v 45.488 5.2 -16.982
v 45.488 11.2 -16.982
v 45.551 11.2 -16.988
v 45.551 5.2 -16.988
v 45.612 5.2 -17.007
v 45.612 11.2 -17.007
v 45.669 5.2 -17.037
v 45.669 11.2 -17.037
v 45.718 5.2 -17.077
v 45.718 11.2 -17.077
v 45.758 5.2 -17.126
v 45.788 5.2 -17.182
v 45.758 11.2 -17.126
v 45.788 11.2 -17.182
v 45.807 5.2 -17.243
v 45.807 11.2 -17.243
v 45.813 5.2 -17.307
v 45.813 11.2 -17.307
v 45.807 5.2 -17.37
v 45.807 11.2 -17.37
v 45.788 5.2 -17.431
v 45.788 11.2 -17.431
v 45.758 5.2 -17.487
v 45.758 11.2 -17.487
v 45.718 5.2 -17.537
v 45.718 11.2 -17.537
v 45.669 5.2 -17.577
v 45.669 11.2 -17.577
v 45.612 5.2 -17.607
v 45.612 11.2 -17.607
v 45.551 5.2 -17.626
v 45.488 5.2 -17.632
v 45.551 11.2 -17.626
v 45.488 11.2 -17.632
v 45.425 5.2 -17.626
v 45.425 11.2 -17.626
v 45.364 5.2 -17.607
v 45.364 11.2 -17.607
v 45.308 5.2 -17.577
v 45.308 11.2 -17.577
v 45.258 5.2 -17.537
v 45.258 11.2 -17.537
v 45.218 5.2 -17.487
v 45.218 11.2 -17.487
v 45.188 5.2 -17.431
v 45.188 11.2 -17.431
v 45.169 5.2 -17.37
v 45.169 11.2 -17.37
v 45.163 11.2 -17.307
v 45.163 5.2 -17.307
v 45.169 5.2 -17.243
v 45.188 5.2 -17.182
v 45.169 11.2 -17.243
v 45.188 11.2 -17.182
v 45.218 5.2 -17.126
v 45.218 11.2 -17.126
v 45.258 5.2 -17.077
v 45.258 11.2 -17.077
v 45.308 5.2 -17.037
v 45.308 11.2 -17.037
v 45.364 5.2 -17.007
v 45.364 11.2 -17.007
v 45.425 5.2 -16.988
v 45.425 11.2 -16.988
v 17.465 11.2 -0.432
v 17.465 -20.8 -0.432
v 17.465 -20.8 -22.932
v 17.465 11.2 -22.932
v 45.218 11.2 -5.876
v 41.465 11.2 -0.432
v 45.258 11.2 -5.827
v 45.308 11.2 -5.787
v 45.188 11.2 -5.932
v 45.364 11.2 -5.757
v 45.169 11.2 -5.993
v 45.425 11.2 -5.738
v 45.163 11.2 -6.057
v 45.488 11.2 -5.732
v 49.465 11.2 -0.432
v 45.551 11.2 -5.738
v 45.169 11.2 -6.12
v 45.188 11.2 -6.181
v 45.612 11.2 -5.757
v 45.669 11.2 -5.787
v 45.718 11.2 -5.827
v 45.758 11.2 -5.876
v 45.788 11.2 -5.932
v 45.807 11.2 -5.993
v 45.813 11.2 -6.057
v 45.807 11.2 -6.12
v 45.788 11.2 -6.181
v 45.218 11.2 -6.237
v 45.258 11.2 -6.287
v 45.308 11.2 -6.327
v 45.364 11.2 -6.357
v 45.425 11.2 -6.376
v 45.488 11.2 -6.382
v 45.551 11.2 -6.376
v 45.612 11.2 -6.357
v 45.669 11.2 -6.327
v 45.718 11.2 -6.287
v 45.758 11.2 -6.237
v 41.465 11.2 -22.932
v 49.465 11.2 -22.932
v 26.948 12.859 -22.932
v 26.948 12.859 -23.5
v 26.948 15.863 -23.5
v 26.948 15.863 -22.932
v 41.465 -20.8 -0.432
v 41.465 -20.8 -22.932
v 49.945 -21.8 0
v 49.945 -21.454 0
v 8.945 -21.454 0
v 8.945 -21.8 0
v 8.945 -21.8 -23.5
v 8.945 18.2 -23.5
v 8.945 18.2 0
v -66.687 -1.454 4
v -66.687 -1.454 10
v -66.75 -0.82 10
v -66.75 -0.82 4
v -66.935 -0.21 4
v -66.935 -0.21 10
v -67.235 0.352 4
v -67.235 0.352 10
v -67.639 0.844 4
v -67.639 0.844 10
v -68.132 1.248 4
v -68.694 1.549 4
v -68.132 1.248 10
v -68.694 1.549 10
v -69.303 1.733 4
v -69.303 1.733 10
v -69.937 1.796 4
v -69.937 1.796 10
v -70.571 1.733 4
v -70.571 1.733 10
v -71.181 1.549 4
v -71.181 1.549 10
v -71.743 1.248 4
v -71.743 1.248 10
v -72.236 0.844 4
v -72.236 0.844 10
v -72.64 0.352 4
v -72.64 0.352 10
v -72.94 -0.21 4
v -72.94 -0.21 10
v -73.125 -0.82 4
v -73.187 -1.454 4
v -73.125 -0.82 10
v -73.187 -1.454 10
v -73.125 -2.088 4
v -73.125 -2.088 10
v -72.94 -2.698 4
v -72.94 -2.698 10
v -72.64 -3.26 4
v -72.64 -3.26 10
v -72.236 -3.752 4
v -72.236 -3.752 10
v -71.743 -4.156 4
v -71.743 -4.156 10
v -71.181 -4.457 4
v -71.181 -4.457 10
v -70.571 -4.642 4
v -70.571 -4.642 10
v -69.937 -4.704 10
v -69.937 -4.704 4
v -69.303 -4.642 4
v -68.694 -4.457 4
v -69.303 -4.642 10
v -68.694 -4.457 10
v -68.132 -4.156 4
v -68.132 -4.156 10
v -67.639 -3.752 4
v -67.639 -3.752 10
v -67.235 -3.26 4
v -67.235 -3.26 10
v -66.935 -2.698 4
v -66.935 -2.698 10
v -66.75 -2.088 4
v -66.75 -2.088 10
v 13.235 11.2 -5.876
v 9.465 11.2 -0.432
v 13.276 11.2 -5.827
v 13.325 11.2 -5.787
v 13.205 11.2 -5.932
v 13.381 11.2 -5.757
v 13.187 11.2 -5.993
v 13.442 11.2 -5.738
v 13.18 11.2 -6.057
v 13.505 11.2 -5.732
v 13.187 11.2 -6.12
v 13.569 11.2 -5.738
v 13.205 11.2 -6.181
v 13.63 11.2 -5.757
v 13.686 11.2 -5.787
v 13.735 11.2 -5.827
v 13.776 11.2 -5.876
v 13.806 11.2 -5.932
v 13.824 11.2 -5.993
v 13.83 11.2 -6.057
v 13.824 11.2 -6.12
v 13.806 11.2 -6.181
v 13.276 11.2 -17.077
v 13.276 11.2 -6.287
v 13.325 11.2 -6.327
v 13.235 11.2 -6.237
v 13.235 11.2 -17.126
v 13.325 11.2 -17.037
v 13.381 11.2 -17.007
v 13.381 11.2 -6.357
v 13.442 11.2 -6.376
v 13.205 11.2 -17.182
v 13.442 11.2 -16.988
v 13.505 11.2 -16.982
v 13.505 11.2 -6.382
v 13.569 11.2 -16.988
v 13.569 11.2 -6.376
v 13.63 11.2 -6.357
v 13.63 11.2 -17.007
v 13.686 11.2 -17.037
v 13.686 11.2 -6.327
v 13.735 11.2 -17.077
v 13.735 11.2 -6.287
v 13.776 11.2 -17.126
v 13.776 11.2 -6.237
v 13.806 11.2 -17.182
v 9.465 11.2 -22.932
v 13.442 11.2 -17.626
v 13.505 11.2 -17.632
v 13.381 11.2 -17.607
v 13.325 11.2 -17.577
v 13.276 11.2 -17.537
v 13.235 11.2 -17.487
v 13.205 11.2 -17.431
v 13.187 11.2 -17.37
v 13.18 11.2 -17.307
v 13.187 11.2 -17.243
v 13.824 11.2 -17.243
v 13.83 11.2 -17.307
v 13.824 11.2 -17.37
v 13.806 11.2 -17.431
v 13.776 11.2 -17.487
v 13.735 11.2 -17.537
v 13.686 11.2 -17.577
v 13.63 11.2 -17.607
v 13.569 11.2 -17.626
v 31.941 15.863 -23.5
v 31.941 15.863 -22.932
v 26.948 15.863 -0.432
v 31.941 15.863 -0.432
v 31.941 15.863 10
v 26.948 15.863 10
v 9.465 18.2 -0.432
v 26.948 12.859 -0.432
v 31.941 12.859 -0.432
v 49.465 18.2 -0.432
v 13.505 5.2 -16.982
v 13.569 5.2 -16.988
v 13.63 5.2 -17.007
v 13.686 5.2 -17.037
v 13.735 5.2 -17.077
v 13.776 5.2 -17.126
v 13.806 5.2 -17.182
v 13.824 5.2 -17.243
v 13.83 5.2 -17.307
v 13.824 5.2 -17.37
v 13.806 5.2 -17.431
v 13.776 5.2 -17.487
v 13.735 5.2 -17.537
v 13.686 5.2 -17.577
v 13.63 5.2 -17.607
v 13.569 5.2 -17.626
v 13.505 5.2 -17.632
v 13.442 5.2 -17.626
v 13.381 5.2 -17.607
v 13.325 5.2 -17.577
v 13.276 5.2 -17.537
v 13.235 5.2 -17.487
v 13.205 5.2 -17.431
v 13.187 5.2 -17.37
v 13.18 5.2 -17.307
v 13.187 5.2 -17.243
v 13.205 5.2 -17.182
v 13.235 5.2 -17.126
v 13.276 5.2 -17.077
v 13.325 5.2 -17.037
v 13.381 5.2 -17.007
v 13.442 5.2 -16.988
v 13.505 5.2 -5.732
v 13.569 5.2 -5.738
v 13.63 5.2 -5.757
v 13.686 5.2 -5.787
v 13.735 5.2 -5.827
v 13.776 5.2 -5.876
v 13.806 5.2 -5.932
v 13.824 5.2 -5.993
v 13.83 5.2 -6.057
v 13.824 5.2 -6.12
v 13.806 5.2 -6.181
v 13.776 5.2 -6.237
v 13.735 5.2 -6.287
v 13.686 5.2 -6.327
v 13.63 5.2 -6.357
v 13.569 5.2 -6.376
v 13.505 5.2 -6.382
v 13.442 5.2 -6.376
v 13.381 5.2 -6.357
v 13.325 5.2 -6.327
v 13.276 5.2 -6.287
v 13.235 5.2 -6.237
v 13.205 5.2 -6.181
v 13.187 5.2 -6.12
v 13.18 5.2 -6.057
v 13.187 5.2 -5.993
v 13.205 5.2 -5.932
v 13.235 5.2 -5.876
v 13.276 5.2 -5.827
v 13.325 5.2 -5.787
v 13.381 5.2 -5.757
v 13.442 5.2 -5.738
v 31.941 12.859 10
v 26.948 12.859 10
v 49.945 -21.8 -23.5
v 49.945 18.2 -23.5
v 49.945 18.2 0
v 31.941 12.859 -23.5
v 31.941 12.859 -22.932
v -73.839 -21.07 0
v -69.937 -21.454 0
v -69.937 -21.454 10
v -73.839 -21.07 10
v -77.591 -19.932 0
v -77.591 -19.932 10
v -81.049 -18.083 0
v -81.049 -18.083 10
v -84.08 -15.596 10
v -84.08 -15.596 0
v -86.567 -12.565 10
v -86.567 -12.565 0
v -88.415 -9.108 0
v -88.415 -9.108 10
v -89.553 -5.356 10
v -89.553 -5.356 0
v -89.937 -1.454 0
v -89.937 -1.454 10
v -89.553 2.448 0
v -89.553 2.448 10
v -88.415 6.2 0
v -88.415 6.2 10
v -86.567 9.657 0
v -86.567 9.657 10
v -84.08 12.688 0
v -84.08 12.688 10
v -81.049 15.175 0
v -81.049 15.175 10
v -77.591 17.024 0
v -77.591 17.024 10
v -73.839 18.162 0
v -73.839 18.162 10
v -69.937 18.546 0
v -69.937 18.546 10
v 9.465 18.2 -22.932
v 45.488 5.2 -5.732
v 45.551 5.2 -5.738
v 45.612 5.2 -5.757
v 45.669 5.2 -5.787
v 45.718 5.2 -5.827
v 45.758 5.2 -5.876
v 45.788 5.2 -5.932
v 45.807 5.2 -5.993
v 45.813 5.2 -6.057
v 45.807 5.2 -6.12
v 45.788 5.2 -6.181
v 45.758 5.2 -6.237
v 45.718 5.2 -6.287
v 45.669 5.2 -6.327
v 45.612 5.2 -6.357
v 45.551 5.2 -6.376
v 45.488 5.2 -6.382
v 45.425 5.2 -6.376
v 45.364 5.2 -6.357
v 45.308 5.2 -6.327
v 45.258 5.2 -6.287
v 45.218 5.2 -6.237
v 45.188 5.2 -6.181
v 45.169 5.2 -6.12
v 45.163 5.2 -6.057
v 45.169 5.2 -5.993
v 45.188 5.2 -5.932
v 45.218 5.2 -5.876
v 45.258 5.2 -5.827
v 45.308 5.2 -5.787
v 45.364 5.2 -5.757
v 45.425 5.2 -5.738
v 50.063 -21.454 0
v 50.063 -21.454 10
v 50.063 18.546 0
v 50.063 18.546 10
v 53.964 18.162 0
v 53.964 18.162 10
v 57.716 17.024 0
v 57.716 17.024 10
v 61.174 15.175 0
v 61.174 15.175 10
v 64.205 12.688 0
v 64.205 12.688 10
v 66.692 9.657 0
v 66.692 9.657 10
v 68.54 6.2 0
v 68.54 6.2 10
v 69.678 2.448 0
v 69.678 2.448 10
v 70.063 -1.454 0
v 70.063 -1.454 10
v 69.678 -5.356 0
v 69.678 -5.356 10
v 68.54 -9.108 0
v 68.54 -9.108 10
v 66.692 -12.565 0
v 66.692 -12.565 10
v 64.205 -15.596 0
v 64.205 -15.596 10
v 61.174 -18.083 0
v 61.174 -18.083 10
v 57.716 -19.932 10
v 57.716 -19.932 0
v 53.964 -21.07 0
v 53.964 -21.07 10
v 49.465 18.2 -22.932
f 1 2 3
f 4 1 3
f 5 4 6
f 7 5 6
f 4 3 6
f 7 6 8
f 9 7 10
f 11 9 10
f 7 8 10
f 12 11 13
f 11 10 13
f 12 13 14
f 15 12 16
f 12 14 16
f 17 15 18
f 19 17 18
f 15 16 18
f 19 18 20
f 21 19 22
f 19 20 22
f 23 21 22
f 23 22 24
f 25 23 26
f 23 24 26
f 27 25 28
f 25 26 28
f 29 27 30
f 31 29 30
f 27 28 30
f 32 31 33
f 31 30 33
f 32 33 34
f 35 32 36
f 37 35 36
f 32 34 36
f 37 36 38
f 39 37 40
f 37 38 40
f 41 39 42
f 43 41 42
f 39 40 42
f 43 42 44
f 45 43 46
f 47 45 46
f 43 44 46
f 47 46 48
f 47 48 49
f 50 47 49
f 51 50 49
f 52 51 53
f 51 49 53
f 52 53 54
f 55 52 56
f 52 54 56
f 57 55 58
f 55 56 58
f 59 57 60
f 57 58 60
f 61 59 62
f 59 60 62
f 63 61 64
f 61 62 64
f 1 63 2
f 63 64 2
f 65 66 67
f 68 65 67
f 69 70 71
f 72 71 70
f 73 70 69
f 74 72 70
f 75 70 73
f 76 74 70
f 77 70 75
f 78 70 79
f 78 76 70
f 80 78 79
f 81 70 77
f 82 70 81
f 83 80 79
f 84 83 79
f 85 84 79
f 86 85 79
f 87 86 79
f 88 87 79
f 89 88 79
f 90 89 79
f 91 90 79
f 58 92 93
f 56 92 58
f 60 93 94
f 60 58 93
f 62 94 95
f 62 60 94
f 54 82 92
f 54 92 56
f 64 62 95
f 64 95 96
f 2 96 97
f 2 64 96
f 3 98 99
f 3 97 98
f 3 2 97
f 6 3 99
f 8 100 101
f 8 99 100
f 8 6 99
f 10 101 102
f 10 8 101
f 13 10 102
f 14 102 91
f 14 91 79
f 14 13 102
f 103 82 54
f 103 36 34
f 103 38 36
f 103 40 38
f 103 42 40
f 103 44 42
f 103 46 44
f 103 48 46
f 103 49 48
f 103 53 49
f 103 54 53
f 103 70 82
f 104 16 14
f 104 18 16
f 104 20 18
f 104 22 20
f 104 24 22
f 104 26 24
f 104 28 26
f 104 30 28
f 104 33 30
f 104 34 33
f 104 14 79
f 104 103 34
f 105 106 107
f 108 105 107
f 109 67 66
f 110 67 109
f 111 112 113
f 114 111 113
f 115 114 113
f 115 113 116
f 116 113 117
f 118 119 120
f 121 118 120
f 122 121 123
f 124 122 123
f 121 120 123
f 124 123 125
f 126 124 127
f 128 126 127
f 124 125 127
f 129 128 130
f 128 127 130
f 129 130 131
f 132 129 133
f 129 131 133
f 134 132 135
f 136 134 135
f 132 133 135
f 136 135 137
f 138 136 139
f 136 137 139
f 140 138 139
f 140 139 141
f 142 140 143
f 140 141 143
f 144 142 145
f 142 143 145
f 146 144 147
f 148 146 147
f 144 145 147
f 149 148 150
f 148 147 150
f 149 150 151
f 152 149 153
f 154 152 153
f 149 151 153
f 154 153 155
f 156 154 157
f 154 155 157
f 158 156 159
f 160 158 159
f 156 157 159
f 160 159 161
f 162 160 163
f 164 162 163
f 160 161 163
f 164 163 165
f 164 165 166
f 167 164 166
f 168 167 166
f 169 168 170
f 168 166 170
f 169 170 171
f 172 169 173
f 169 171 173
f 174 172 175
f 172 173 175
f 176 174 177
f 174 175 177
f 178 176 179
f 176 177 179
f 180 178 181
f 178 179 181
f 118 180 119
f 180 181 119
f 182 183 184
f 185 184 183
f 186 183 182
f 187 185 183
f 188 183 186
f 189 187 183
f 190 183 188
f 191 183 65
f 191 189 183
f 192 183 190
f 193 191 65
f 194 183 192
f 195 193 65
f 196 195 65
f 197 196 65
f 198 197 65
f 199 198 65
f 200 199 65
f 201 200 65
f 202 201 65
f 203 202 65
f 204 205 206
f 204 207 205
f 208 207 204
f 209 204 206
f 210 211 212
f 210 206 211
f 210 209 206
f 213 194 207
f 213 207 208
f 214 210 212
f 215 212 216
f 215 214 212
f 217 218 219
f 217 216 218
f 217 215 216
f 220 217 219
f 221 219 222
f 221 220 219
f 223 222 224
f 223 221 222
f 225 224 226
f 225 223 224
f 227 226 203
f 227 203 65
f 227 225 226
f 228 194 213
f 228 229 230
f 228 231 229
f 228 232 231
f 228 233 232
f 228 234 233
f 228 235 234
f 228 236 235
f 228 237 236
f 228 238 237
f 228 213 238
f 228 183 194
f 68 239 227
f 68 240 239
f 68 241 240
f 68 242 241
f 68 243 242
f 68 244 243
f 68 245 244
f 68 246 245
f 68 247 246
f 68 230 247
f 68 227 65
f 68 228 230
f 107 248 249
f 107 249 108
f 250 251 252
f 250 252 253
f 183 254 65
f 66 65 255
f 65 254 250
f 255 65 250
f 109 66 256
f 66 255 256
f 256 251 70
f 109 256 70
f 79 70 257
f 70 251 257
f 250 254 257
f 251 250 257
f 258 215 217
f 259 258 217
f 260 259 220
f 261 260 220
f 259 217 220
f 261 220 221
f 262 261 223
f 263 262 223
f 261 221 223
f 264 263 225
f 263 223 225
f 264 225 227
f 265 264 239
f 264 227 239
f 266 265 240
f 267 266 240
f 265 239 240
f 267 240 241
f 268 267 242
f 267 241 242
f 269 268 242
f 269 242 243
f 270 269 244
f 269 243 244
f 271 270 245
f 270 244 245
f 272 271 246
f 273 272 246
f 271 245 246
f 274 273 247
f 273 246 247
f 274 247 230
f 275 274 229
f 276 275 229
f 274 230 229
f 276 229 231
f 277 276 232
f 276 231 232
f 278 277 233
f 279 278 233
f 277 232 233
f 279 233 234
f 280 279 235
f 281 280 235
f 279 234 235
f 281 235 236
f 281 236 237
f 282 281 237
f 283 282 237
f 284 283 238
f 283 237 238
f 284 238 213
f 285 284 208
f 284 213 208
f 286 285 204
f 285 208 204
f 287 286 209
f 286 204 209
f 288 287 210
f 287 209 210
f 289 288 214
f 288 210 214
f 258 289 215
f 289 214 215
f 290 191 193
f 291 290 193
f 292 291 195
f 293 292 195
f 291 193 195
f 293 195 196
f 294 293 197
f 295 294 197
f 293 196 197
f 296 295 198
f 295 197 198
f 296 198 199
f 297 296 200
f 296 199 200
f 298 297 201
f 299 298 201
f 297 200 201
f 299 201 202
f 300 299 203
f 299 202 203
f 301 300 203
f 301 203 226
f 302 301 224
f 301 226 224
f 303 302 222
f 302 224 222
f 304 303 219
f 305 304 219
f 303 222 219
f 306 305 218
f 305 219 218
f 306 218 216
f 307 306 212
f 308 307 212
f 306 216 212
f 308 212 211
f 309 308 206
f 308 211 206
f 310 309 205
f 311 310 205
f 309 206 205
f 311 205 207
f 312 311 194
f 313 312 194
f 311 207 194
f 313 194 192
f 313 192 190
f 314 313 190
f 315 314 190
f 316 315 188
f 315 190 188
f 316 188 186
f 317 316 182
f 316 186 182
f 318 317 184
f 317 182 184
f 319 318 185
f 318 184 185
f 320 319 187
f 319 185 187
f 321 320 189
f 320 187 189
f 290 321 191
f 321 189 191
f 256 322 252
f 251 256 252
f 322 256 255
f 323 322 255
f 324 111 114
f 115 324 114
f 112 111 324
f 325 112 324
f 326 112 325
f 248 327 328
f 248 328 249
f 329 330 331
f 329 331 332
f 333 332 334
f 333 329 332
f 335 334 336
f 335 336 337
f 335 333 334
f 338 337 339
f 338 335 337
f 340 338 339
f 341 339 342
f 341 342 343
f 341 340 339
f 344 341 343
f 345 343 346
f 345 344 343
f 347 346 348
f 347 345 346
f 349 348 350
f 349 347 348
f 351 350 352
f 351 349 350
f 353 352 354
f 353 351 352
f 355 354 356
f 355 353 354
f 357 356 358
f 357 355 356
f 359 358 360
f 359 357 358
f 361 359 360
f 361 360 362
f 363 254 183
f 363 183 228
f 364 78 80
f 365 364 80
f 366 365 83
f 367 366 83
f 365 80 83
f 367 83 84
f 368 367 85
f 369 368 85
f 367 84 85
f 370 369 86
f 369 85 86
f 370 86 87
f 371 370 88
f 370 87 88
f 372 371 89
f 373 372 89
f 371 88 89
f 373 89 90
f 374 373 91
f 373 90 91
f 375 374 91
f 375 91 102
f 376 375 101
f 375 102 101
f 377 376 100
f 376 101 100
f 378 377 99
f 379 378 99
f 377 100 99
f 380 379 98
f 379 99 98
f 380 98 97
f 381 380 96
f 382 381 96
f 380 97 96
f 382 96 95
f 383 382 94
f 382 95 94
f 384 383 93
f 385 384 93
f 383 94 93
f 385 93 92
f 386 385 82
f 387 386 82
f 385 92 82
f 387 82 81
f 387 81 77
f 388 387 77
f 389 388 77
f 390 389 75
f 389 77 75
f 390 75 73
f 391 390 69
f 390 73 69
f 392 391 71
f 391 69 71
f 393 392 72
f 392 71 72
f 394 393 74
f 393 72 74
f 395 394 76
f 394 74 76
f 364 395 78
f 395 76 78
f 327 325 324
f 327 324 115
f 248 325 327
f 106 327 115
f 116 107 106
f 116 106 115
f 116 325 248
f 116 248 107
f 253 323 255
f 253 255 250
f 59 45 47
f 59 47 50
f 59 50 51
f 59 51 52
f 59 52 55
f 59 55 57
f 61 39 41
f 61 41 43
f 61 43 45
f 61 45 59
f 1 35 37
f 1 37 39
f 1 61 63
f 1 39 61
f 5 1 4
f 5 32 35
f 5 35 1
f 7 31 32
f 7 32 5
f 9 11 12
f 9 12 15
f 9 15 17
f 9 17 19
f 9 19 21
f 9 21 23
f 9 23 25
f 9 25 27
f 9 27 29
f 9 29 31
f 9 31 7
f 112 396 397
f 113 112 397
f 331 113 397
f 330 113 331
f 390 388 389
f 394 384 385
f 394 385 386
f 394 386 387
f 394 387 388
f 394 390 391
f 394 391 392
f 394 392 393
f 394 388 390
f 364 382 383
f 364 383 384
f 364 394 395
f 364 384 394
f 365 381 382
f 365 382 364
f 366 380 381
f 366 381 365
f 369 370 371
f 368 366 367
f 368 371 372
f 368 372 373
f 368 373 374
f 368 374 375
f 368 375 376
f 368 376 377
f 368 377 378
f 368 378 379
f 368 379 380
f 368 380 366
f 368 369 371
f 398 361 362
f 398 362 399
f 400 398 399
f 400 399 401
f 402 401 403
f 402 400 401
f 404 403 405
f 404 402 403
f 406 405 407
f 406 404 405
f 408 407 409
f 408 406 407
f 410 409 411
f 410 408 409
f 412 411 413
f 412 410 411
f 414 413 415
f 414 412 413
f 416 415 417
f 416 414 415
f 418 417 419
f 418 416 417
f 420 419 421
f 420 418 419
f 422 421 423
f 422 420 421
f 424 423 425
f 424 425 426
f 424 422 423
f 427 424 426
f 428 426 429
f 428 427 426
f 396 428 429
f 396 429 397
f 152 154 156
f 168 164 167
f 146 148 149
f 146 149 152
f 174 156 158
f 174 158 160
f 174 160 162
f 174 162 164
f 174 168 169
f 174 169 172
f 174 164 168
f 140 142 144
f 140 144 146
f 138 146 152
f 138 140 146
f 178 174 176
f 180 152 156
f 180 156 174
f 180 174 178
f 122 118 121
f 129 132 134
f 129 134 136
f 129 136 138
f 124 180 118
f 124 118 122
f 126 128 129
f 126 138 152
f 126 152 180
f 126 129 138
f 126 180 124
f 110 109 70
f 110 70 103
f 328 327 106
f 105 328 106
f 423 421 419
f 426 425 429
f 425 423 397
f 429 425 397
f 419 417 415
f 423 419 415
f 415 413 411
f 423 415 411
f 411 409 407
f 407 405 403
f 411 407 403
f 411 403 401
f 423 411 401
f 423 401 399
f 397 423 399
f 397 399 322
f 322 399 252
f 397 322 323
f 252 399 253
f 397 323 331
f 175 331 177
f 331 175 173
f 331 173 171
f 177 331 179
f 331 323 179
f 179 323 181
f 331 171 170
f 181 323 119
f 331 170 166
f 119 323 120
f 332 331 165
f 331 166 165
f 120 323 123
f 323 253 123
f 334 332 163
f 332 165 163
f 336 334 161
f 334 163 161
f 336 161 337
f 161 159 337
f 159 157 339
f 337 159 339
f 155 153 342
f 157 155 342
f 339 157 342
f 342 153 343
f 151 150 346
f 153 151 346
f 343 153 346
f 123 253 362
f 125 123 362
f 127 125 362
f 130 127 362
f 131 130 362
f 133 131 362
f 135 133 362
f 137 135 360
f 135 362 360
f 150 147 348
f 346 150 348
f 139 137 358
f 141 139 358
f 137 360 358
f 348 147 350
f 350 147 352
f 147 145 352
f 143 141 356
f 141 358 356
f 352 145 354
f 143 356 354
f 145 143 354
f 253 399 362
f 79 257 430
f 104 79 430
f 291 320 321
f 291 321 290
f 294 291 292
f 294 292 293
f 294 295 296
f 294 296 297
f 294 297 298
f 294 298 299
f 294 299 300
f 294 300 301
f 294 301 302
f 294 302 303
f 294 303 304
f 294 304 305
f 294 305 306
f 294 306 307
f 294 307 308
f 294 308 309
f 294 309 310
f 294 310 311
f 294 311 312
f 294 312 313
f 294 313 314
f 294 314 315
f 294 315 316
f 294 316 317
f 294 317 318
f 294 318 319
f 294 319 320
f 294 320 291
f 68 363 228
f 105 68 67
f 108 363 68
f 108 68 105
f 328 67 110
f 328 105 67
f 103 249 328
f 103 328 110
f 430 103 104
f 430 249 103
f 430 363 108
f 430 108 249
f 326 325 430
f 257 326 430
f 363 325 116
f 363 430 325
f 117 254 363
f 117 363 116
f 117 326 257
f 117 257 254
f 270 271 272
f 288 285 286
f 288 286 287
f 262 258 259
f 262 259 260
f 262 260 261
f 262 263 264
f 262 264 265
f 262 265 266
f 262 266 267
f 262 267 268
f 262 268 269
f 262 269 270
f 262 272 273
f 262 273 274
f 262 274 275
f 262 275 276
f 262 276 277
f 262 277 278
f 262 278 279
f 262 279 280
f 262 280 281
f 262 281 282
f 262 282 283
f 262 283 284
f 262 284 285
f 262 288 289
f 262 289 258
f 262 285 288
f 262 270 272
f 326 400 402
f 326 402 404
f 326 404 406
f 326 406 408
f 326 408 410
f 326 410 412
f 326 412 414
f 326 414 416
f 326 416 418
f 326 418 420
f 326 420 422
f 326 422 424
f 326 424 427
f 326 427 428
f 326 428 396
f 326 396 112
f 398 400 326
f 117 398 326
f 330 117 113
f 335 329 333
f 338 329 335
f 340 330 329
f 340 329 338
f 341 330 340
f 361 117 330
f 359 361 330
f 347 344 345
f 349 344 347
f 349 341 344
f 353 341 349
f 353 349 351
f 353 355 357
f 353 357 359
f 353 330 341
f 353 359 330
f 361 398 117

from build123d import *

# Parameters (mm, degrees)
BOSS_EXTRUDE1_DEPTH = 10
SKETCH2_R           = 3.25
CUT_EXTRUDE1_DEPTH  = 6
SKETCH3_W           = 41
SKETCH3_H           = 40
BOSS_EXTRUDE2_DEPTH = 23.5
SKETCH6_W           = 40
SKETCH6_H           = 22.5
CUT_EXTRUDE3_DEPTH  = 39
SKETCH7_W           = 8
SKETCH7_H           = 22.5
BOSS_EXTRUDE3_DEPTH = 32
SKETCH8_R           = 0.325
CUT_EXTRUDE4_DEPTH  = 6
SKETCH9_W           = 4.992378119
SKETCH9_H           = 3.003564519
CUT_EXTRUDE5_DEPTH  = 55


with BuildPart() as part:
    # Sketch1 → Boss-Extrude1 (new body)
    with BuildSketch(Plane.XY):
        with BuildLine():
            Line((-69.937444572, 18.545911552), (50.062555428, 18.545911552))
            ThreePointArc((50.062555428, 18.545911552), (70.062555428, -1.454088448), (50.062555428, -21.454088448))
            Line((50.062555428, -21.454088448), (-69.937444572, -21.454088448))
            ThreePointArc((-69.937444572, -21.454088448), (-89.937444572, -1.454088448), (-69.937444572, 18.545911552))
        make_face()
    extrude(amount=BOSS_EXTRUDE1_DEPTH)

    # Sketch2 → Cut-Extrude1 (cut)
    with BuildSketch(Plane.XY.offset(10)):
        with Locations((-69.937444572, -1.454088448)):
            Circle(SKETCH2_R)
    extrude(amount=-CUT_EXTRUDE1_DEPTH, mode=Mode.SUBTRACT)

    # Sketch3 → Boss-Extrude2 (add)
    with BuildSketch(Plane(origin=(0, 0, 0), x_dir=(-1, 0, 0), z_dir=(0, 0, -1))):
        with Locations((-29.444527942, -1.79966235)):
            Rectangle(SKETCH3_W, SKETCH3_H)
    extrude(amount=BOSS_EXTRUDE2_DEPTH)

    # Sketch6 → Cut-Extrude3 (cut)
    with BuildSketch(Plane(origin=(0, 18.20033765, 0), x_dir=(1, 0, 0), z_dir=(0, 1, 0))):
        with Locations((29.465316663, 11.681829122)):
            Rectangle(SKETCH6_W, SKETCH6_H)
    extrude(amount=-CUT_EXTRUDE3_DEPTH, mode=Mode.SUBTRACT)

    # Sketch7 → Boss-Extrude3 (add)
    with BuildSketch(Plane(origin=(0, -20.79966235, 0), x_dir=(1, 0, 0), z_dir=(0, 1, 0))):
        with Locations((13.465316663, 11.681829122)):
            Rectangle(SKETCH7_W, SKETCH7_H)
        with Locations((45.465316663, 11.681829122)):
            Rectangle(SKETCH7_W, SKETCH7_H)
    extrude(amount=BOSS_EXTRUDE3_DEPTH)

    # Sketch8 → Cut-Extrude4 (cut)
    with BuildSketch(Plane(origin=(0, 11.20033765, 0), x_dir=(1, 0, 0), z_dir=(0, 1, 0))):
        with Locations(Location((45.488062991, 17.306829122, 0), (0, 0, 270))):
            Circle(SKETCH8_R)
        with Locations(Location((45.488062991, 6.056829122, 0), (0, 0, 270))):
            Circle(SKETCH8_R)
        with Locations(Location((13.505340173, 17.306829122, 0), (0, 0, 270))):
            Circle(SKETCH8_R)
        with Locations(Location((13.505340173, 6.056829122, 0), (0, 0, 270))):
            Circle(SKETCH8_R)
    extrude(amount=-CUT_EXTRUDE4_DEPTH, mode=Mode.SUBTRACT)

    # Sketch9 → Cut-Extrude5 (cut)
    with BuildSketch(Plane(origin=(0, 0, -23.5), x_dir=(-1, 0, 0), z_dir=(0, 0, -1))):
        with Locations((-29.444527942, 14.360774469)):
            Rectangle(SKETCH9_W, SKETCH9_H)
    extrude(amount=-CUT_EXTRUDE5_DEPTH, mode=Mode.SUBTRACT)


solid = part.part
